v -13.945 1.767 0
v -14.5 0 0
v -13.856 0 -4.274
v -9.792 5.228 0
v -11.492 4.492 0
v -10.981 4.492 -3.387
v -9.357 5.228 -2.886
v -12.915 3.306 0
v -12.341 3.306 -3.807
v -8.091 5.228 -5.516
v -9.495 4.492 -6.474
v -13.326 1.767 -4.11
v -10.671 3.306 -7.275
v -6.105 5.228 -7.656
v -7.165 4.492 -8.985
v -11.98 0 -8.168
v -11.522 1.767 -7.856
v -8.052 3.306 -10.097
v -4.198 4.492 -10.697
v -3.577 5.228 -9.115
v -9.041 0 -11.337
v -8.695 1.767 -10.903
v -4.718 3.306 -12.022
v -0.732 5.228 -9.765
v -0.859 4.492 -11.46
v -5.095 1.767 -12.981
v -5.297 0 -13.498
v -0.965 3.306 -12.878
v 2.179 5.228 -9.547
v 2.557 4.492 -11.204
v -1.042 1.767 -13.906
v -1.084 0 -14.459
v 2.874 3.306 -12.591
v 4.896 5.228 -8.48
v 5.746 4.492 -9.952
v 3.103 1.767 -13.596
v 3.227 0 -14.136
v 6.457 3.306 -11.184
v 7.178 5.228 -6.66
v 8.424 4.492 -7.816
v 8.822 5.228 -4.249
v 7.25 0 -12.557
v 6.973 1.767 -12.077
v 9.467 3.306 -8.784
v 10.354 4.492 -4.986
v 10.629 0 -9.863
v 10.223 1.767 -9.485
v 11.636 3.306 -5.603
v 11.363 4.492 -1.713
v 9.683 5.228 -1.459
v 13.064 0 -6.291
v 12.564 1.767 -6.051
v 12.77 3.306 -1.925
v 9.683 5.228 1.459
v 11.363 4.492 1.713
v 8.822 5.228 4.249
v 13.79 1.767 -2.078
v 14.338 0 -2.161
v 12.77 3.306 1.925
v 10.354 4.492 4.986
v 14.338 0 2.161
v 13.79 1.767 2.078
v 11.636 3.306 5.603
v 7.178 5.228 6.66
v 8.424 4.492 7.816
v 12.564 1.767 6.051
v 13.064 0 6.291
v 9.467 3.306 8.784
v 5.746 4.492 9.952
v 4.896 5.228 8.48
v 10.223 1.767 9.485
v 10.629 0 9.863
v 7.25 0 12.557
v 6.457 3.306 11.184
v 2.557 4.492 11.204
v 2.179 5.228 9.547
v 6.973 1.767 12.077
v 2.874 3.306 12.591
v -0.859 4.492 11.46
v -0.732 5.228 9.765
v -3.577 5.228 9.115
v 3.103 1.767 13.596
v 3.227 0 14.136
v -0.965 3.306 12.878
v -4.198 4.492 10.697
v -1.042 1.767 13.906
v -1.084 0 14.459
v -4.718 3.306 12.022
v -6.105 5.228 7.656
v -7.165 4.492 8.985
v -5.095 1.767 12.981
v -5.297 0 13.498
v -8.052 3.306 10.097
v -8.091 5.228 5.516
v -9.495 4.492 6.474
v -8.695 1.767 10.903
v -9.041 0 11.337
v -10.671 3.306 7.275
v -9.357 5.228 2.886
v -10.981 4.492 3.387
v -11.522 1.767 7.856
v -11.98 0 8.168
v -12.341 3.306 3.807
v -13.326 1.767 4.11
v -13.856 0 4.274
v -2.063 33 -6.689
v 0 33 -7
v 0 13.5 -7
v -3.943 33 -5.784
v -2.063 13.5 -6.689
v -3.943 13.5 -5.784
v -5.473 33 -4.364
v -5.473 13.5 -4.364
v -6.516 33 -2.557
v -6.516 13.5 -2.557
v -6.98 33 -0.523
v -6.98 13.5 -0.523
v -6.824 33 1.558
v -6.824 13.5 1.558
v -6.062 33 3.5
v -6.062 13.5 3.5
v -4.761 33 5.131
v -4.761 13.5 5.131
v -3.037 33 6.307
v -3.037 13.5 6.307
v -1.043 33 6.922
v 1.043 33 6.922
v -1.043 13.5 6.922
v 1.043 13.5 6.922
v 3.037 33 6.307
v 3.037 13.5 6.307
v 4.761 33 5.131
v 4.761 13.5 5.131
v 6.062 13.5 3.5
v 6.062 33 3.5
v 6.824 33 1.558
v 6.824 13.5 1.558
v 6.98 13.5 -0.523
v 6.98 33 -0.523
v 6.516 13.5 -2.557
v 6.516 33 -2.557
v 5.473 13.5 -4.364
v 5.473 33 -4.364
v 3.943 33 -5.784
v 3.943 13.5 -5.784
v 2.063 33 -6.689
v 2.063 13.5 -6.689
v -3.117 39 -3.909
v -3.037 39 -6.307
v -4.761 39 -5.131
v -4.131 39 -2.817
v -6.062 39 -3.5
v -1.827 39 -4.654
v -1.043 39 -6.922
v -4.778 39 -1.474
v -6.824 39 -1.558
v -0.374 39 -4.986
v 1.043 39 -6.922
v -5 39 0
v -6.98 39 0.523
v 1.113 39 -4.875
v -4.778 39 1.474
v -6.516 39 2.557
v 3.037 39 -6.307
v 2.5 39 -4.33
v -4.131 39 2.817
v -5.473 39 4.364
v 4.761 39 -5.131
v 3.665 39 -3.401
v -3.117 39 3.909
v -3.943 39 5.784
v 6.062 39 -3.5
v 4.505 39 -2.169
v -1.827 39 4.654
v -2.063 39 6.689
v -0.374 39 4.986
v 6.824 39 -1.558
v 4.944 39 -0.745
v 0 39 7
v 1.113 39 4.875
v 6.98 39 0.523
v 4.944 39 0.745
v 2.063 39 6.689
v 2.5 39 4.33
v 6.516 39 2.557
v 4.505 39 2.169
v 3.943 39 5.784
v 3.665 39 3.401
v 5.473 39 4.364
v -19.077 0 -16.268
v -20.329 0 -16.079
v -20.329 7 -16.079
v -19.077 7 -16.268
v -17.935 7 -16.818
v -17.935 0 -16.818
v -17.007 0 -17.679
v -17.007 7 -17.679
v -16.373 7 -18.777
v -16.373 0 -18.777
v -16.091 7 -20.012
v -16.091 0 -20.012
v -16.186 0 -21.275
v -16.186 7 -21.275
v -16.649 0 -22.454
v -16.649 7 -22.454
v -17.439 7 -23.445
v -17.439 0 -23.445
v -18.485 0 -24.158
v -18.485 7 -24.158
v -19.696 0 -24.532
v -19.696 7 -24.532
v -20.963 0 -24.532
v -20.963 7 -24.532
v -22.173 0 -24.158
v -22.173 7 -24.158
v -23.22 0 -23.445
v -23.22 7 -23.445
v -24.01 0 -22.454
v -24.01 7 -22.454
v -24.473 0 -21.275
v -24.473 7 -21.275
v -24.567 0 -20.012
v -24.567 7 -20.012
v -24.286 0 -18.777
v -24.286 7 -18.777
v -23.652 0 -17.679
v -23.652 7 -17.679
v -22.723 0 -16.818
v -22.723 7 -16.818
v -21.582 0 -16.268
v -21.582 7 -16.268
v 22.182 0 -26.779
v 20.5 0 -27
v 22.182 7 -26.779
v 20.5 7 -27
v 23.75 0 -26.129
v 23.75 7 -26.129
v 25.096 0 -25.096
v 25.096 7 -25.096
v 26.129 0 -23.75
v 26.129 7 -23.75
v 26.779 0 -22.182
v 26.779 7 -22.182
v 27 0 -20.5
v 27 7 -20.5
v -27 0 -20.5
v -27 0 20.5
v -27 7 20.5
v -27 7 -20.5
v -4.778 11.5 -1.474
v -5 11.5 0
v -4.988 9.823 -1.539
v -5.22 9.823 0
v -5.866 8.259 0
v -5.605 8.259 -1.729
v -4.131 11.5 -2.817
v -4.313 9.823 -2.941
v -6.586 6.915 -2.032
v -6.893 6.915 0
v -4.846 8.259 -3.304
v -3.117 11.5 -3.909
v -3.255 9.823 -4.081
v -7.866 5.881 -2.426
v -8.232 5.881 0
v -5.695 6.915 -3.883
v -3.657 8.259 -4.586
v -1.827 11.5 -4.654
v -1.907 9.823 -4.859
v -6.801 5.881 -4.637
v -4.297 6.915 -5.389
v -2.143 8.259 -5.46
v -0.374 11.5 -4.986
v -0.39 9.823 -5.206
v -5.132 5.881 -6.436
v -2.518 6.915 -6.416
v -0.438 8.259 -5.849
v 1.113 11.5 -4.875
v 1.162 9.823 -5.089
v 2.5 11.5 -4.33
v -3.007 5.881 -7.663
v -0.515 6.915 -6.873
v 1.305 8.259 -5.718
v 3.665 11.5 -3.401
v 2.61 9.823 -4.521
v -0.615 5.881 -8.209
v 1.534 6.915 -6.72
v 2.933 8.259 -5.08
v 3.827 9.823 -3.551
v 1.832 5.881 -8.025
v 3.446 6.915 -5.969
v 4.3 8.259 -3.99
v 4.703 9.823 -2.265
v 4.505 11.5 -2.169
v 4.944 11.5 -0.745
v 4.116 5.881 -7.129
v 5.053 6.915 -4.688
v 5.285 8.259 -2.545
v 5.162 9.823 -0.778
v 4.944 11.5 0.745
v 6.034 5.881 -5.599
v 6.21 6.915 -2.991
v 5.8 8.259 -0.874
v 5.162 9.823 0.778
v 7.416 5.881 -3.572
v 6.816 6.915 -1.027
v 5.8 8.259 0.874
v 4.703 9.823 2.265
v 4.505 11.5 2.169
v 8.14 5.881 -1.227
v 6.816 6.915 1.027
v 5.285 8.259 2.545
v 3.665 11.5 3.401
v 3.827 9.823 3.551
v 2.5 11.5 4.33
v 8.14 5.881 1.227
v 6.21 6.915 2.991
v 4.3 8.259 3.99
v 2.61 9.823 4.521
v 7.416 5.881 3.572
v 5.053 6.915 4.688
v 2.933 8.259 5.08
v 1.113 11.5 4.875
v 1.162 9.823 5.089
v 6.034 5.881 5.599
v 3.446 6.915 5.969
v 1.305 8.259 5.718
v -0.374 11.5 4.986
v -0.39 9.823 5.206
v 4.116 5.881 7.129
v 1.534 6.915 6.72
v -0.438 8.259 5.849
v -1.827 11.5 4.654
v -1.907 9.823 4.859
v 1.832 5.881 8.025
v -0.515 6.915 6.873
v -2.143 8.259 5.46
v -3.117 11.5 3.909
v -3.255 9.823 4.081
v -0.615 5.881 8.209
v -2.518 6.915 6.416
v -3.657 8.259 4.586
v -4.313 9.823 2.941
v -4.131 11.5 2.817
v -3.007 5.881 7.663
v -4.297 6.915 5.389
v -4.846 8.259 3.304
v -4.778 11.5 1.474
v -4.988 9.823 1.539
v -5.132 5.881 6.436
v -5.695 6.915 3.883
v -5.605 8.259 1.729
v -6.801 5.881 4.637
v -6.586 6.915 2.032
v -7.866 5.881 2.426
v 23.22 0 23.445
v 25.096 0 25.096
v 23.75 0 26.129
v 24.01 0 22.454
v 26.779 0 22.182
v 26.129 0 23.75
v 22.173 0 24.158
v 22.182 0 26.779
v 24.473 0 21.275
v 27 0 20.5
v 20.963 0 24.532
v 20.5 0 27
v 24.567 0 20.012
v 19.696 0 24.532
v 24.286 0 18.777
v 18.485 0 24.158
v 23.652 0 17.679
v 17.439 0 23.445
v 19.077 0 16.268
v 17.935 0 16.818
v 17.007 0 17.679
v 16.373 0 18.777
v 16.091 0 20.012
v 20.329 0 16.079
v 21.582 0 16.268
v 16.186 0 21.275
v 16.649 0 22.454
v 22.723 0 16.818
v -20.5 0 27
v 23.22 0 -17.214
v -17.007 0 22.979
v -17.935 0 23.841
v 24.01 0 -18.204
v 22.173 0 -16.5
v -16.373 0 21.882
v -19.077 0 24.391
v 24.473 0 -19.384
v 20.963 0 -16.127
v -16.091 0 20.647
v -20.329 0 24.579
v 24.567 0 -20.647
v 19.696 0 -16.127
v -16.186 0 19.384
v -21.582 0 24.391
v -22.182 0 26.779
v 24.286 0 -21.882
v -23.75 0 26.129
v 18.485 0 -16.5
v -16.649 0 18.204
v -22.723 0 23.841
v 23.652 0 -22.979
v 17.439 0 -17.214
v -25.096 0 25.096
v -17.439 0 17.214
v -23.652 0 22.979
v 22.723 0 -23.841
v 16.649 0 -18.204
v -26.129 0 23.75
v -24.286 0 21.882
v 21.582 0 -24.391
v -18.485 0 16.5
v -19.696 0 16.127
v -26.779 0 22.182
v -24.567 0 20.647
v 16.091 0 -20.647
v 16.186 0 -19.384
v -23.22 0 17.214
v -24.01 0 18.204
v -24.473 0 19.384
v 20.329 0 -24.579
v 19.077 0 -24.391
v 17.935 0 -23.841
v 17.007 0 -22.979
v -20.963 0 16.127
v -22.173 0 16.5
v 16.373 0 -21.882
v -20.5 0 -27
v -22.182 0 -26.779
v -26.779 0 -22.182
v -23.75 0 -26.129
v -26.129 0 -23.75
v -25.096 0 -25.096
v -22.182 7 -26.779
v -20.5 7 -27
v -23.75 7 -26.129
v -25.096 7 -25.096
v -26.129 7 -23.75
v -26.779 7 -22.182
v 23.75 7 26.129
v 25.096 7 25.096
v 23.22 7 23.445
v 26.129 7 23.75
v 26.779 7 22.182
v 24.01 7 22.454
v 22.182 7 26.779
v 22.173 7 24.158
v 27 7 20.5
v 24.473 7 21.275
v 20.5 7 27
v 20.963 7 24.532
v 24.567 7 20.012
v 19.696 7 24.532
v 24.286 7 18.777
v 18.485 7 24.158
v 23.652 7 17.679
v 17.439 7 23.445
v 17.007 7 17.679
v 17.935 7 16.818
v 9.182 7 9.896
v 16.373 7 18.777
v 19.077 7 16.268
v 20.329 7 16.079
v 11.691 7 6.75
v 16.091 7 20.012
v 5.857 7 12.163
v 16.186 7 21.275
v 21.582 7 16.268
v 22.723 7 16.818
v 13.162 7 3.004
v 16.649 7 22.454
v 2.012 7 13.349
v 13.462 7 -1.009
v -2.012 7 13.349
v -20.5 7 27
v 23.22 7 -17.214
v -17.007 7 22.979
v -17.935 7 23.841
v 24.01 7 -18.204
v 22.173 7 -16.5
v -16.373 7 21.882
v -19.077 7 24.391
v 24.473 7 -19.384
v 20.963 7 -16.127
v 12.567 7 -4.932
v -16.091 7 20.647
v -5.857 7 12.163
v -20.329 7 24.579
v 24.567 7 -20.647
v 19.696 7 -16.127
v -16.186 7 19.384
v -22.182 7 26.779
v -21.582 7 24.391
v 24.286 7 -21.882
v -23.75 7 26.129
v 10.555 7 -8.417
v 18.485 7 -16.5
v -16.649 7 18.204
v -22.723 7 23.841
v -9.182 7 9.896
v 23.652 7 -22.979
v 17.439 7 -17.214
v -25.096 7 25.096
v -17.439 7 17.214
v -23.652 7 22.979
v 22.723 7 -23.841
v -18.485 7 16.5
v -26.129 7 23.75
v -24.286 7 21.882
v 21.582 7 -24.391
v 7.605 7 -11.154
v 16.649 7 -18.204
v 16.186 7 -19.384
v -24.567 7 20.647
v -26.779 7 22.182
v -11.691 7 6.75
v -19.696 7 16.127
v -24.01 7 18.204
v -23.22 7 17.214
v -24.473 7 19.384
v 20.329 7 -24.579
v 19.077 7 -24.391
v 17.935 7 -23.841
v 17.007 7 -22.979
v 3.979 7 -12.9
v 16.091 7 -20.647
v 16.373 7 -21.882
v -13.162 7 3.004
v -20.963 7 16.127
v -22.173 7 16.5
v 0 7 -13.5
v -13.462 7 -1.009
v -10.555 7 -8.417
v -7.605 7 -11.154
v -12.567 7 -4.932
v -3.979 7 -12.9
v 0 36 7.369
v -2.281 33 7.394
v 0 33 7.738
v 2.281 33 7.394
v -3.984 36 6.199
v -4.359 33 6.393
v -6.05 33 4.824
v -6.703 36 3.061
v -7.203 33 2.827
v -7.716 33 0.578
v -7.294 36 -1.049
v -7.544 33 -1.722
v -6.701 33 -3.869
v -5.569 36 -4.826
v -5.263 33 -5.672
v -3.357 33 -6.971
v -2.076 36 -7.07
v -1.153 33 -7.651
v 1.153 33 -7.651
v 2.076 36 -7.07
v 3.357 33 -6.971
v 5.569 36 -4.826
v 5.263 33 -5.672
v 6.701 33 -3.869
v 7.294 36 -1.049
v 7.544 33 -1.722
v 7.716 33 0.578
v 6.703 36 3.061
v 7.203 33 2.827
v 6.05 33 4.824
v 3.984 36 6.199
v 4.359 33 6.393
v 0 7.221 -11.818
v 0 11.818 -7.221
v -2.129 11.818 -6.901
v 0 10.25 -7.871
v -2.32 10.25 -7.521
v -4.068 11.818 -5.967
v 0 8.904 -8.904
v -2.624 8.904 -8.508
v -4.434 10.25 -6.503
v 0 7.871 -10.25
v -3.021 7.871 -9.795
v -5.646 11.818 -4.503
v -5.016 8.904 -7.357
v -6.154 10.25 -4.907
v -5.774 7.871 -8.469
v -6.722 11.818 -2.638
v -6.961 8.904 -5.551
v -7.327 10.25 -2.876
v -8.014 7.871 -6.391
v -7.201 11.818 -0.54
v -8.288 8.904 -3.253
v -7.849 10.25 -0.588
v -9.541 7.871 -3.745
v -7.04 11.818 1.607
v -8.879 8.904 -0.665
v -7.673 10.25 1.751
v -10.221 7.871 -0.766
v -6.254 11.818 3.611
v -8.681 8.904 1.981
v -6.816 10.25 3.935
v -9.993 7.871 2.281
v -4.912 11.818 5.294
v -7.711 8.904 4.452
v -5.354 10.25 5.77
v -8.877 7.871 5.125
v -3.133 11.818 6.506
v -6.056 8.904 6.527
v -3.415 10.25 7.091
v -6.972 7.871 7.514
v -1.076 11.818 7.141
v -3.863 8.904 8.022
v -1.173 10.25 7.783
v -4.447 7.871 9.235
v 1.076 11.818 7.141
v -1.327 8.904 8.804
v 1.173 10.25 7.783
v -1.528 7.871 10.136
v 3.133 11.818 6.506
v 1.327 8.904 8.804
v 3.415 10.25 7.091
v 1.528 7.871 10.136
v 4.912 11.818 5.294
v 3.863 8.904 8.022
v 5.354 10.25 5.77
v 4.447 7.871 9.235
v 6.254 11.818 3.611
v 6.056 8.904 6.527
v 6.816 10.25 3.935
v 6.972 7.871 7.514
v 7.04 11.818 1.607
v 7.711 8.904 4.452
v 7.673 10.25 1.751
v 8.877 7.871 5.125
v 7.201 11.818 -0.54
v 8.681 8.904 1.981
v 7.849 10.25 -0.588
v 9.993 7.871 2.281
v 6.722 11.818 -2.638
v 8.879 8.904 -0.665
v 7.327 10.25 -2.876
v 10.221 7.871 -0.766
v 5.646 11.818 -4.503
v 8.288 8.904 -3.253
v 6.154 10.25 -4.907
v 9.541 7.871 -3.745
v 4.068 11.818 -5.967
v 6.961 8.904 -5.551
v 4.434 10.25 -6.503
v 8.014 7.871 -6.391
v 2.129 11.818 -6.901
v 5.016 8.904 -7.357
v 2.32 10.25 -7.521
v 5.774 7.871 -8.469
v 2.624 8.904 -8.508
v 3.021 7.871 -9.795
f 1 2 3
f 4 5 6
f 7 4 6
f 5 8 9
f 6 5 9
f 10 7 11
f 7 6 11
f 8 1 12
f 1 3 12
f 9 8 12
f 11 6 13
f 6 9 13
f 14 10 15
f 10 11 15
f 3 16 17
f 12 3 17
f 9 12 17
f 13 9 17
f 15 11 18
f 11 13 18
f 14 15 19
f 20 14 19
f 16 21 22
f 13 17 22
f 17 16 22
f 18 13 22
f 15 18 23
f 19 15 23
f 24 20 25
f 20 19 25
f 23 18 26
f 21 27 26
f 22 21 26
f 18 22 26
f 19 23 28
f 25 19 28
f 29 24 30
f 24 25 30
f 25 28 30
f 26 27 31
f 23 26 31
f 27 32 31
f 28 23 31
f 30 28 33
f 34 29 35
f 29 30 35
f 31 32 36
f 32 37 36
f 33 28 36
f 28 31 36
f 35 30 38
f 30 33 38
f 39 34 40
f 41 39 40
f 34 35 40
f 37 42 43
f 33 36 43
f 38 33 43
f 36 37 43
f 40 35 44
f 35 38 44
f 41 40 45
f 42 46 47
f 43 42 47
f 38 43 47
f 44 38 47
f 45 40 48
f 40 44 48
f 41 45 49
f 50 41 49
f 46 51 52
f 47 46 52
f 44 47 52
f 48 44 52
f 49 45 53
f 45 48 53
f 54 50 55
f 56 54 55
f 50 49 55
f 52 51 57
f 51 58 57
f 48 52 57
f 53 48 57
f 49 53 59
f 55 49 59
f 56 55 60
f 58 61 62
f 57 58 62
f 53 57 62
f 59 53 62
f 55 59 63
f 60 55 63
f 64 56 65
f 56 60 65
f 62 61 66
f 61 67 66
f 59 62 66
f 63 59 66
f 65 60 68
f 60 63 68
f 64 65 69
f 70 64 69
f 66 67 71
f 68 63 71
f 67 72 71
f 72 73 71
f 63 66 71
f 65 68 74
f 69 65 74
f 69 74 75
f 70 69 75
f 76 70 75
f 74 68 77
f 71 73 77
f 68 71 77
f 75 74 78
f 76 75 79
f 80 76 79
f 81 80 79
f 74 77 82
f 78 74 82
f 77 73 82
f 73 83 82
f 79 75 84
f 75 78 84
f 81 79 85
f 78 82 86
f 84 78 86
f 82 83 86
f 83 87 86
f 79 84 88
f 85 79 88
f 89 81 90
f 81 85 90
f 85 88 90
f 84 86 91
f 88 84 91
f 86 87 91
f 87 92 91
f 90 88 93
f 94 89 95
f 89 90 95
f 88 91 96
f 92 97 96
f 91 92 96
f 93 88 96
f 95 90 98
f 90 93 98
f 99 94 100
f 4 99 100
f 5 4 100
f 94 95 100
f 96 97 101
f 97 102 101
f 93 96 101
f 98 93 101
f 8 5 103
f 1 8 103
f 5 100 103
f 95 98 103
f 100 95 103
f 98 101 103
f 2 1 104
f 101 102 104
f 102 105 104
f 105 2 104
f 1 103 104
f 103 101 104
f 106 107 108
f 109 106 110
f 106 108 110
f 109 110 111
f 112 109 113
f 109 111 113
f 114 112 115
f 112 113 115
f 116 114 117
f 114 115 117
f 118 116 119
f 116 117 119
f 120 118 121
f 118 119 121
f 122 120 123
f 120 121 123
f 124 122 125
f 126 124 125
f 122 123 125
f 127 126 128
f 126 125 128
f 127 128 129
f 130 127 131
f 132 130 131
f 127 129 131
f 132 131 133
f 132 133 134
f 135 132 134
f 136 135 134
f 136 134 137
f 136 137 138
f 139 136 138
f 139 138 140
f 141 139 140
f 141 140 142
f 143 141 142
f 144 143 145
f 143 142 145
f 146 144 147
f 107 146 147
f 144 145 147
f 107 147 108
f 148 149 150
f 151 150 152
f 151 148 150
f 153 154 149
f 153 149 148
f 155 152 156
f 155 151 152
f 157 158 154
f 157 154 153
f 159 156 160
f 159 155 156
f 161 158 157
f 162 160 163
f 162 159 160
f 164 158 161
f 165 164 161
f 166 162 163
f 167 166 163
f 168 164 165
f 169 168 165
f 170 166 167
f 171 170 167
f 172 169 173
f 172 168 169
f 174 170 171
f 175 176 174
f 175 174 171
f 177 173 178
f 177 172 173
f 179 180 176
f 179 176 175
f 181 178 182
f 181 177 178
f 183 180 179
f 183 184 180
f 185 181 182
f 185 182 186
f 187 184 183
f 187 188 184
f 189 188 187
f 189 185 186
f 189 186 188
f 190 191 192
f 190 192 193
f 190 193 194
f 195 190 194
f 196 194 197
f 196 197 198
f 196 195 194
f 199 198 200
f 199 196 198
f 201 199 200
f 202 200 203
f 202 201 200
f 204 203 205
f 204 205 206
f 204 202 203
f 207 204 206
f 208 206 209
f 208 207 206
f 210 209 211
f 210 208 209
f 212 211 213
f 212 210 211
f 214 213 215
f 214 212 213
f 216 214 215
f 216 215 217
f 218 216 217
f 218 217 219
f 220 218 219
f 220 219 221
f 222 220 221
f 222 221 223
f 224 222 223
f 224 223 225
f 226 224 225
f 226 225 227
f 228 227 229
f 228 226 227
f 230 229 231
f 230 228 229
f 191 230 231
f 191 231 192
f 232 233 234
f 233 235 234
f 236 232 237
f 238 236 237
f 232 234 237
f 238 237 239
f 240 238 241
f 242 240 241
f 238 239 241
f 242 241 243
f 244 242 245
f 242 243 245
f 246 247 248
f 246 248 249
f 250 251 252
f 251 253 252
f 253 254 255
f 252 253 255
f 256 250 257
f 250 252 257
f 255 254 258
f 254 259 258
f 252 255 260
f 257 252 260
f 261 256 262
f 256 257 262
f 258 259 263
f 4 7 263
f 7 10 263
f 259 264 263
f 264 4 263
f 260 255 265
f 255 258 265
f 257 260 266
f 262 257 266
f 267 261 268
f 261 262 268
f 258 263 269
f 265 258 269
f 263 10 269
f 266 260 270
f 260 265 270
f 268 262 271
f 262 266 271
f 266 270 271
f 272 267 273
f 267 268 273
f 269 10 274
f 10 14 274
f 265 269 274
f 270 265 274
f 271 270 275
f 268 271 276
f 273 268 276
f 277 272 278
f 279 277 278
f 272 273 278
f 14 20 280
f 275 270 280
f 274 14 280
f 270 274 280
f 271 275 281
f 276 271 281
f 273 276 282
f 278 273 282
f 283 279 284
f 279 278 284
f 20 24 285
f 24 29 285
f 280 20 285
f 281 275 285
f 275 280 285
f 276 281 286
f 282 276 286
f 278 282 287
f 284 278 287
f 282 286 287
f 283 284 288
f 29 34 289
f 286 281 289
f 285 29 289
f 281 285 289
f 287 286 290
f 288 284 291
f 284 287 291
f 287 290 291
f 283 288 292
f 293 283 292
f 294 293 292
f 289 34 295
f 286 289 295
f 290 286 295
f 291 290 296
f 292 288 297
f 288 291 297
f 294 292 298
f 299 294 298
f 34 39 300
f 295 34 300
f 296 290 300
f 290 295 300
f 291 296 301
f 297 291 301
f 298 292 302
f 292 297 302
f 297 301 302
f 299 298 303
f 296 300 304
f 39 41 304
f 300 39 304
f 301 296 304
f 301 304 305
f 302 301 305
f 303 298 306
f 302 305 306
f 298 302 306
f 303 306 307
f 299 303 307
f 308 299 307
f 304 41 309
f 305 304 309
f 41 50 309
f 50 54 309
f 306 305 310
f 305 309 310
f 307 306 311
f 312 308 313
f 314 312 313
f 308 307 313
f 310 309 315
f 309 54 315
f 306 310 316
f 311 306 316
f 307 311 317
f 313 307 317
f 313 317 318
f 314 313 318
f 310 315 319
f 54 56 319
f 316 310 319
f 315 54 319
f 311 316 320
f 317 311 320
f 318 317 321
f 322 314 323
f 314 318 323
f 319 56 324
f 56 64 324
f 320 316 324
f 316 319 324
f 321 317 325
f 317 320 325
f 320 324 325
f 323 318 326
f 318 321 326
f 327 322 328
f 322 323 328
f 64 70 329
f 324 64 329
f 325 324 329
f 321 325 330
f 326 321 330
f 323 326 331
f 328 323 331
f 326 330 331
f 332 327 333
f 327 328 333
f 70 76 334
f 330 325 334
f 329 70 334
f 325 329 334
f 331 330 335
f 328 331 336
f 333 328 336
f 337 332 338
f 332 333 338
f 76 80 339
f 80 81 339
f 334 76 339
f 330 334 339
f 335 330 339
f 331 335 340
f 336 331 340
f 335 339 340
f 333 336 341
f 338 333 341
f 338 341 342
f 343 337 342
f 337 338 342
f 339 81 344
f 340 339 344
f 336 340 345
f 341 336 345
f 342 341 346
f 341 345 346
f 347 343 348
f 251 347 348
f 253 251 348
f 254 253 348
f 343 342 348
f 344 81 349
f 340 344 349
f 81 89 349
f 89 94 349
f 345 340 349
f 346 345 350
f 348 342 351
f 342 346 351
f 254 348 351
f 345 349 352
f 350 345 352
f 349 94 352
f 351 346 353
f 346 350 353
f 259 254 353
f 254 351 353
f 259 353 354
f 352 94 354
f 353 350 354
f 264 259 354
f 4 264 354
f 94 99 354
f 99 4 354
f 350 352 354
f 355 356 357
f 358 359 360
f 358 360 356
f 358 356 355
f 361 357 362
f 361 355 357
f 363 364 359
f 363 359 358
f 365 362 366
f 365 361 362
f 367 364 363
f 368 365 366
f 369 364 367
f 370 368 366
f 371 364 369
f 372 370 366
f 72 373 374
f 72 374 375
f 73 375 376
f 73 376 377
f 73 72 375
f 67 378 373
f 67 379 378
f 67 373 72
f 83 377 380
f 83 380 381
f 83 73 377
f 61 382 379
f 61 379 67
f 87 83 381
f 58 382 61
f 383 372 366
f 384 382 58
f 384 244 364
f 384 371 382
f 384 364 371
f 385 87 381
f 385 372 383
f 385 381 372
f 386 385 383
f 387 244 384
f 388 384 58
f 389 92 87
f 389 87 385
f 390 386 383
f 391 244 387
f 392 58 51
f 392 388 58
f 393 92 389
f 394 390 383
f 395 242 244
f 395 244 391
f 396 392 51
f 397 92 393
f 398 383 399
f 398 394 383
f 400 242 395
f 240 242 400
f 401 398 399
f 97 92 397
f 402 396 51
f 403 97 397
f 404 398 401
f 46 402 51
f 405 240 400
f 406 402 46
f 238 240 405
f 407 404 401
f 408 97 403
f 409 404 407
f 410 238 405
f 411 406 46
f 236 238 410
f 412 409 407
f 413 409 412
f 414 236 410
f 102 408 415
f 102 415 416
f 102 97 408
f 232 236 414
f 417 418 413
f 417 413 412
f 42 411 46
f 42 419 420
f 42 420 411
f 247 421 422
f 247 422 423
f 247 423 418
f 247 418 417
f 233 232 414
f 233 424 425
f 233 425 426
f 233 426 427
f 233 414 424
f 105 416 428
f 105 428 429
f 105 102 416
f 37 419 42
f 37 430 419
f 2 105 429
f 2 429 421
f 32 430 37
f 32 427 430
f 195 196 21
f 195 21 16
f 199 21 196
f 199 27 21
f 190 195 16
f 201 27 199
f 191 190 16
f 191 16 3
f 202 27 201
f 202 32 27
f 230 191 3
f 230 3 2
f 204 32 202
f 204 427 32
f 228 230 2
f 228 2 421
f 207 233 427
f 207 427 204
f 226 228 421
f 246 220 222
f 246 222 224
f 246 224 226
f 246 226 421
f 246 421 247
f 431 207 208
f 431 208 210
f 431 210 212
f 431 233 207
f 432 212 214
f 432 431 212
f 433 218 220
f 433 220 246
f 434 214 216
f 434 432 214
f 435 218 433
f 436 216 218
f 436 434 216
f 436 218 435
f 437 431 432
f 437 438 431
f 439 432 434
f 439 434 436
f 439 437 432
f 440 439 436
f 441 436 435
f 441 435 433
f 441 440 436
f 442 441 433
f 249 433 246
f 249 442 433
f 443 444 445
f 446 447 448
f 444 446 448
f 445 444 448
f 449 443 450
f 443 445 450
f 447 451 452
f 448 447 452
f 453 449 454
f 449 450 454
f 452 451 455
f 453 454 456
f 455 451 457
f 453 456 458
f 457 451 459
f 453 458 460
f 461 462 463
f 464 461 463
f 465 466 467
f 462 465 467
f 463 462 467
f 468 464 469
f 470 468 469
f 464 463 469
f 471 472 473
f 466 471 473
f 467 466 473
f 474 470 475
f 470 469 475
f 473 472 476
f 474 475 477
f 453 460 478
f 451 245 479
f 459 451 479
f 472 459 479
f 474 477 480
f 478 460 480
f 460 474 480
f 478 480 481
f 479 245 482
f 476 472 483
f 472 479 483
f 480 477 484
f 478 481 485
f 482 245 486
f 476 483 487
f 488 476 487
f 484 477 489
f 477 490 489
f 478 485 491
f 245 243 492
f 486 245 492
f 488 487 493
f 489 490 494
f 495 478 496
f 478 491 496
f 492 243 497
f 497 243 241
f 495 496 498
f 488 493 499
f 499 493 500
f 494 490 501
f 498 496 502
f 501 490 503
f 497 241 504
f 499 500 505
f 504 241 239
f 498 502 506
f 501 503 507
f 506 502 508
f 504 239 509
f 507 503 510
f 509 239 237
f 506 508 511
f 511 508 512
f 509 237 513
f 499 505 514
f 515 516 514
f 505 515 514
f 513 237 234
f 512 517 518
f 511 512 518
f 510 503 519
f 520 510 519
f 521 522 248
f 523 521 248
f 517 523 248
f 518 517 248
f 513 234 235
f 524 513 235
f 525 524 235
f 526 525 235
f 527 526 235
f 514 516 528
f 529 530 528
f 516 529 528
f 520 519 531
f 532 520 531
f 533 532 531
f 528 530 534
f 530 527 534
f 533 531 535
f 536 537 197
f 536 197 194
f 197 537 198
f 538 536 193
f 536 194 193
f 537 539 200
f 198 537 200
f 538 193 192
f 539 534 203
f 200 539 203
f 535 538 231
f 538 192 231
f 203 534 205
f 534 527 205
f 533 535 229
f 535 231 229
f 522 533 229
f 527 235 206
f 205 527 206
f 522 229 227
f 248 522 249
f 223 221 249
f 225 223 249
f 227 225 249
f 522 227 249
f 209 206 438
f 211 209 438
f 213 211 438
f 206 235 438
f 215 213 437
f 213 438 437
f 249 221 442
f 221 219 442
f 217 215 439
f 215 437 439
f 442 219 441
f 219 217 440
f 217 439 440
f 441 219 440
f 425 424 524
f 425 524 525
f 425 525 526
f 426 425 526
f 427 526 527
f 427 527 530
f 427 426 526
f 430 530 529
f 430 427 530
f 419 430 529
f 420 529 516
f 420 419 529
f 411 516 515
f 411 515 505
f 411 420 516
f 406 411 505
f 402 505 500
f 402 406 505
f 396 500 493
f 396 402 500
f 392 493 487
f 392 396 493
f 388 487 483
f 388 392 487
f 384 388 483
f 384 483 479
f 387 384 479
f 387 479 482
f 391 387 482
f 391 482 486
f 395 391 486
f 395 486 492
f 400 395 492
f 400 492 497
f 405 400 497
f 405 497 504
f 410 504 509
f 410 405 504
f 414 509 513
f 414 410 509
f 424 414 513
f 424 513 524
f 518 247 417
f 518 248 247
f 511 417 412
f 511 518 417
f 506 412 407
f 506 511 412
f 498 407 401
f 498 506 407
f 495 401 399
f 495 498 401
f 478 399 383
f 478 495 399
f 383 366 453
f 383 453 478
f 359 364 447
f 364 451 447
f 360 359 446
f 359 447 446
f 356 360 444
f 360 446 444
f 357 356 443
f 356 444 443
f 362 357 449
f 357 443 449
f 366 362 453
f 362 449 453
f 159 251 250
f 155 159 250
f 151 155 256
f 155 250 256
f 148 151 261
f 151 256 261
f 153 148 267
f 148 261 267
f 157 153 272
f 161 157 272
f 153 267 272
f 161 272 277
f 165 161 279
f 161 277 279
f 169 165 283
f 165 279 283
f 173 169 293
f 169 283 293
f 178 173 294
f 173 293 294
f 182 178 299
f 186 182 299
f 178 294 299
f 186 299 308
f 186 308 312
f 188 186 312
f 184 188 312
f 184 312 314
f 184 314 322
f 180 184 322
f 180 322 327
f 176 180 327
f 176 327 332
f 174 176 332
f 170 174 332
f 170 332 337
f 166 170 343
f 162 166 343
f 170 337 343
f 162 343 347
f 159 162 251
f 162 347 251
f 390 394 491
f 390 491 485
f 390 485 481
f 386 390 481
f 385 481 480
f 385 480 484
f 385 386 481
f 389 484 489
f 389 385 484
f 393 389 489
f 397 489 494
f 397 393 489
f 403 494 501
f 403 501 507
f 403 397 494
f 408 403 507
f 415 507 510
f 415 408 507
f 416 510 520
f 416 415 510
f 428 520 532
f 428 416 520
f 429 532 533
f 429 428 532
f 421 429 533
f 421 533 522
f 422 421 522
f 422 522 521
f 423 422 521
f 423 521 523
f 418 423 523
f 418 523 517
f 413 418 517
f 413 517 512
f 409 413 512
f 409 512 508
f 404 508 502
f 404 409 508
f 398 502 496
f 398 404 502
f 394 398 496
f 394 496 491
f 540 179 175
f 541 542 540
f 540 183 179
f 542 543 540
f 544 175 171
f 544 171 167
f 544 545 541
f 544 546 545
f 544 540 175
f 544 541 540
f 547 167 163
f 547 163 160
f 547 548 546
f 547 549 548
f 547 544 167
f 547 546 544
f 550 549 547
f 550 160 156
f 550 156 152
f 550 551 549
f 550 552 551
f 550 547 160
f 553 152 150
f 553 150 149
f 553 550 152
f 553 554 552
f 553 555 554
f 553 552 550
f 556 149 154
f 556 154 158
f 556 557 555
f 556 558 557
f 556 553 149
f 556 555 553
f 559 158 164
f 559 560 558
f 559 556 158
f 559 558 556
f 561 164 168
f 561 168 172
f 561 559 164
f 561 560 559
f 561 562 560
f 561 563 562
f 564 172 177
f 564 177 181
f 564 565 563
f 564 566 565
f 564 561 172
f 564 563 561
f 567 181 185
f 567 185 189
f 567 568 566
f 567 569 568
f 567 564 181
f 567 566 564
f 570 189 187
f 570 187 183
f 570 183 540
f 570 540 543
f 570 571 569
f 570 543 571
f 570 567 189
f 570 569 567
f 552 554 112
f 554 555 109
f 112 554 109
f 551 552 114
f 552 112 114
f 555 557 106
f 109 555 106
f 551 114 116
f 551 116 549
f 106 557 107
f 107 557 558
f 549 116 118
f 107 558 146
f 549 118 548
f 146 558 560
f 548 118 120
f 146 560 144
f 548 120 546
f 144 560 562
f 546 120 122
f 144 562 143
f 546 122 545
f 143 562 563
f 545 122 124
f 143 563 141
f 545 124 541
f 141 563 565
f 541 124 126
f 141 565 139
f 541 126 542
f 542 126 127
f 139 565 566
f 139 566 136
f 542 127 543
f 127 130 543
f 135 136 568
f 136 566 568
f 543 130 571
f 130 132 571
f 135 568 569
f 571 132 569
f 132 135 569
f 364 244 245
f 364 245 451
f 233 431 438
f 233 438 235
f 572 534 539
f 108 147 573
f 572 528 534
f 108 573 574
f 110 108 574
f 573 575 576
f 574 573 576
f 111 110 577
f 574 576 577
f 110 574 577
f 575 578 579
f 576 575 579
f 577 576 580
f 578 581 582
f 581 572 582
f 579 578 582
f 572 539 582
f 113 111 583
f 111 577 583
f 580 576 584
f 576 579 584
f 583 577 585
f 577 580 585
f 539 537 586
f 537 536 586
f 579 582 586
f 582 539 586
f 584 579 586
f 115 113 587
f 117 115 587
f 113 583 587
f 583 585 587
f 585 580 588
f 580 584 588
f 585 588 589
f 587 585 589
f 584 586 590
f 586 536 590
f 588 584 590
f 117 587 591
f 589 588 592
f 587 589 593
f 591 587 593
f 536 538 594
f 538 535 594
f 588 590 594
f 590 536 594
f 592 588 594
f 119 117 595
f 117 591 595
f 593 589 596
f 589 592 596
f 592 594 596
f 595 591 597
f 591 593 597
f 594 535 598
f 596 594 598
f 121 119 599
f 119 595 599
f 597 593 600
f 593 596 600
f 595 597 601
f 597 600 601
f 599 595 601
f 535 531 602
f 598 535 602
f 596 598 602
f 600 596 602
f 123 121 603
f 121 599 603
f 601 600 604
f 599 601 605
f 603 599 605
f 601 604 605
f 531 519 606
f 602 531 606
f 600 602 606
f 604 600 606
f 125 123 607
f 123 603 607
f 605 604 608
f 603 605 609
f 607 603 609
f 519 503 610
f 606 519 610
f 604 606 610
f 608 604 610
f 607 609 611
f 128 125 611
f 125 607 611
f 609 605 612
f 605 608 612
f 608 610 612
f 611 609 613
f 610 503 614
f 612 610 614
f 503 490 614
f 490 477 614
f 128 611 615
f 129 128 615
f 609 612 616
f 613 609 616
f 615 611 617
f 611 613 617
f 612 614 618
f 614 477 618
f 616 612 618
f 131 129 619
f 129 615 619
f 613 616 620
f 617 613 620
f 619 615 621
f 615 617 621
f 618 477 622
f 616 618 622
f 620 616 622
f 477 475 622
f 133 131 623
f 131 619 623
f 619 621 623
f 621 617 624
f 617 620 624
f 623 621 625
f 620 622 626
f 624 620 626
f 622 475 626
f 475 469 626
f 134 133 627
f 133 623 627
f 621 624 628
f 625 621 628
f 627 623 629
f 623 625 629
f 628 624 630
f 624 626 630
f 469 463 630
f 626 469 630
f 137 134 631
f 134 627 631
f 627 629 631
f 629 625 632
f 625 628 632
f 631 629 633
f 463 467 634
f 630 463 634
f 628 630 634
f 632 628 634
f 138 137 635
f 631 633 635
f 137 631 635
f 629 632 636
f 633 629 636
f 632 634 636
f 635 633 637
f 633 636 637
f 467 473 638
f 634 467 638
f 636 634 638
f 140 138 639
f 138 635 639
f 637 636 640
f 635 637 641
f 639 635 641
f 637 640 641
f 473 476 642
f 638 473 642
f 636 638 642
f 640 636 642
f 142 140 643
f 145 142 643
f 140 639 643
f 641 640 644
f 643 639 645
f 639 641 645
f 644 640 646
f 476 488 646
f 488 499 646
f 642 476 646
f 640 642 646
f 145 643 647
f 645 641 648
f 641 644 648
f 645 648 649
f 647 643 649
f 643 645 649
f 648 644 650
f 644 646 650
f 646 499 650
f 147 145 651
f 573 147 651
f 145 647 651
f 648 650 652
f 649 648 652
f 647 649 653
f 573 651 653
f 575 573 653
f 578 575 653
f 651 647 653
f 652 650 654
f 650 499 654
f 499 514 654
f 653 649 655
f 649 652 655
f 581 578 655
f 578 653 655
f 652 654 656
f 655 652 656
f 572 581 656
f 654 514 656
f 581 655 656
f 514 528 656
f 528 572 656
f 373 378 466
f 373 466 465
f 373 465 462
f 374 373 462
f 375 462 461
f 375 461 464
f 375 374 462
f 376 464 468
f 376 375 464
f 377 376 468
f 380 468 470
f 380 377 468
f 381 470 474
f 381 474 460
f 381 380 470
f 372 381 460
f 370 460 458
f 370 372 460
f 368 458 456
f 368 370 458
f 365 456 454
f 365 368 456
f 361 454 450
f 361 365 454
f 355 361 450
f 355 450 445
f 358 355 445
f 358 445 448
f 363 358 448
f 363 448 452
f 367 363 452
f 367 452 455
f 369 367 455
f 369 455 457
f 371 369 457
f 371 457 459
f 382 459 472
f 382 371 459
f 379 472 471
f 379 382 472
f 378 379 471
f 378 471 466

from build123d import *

# Parameters (mm, degrees)
SKETCH1_R           = 4.250000000000005
SKETCH1_R_2         = 4.250000000000013
SKETCH1_R_3         = 4.2500000000000036
BOSS_EXTRUDE1_DEPTH = 7
FILLET2_R           = 6.5
SKETCH4_R           = 7
BOSS_EXTRUDE3_DEPTH = 26
SKETCH5_R           = 7.75
BOSS_EXTRUDE4_DEPTH = 6
FILLET3_R           = 6.5
FILLET4_R           = 6.5
FILLET5_R           = 6.5


with BuildPart() as part:
    # Sketch1 → Boss-Extrude1 (new body)
    with BuildSketch(Plane(origin=(0, 0, 0), x_dir=(1, 0, 0), z_dir=(0, 1, 0))):
        Polygon((-27, 27), (27, 27), (27.000000000000007, -27), (-26.999999999999993, -27), align=None)
        with Locations(Location((-20.329319959113246, 20.329319959113246, 0), (0, 0, 270))):
            Circle(SKETCH1_R, mode=Mode.SUBTRACT)
        with Locations(Location((20.32931995911324, -20.329319959113246, 0), (0, 0, 90))):
            Circle(SKETCH1_R_2, mode=Mode.SUBTRACT)
        with Locations(Location((-20.329319959113224, -20.329319959113246, 0), (0, 0, 270))):
            Circle(SKETCH1_R_2, mode=Mode.SUBTRACT)
        with Locations(Location((20.329319959113246, 20.329319959113253, 0), (0, 0, 90))):
            Circle(SKETCH1_R_3, mode=Mode.SUBTRACT)
    extrude(amount=BOSS_EXTRUDE1_DEPTH)

    # Fillet2
    fillet2_edges = [part.edges().sort_by_distance(p)[0] for p in [
        (27.000000000000007, 3.5, 27),
        (-26.999999999999993, 3.5, 27),
        (-27, 3.5, -27),
        (27, 3.5, -27),
    ]]
    fillet(fillet2_edges, radius=FILLET2_R)

    # Sketch4 → Boss-Extrude3 (add)
    with BuildSketch(Plane(origin=(0, 7, 0), x_dir=(1, 0, 0), z_dir=(0, 1, 0))):
        with Locations(Location((0, 0, 0), (0, 0, 90))):
            Circle(SKETCH4_R)
    extrude(amount=BOSS_EXTRUDE3_DEPTH)

    # Sketch5 → Boss-Extrude4 (add)
    with BuildSketch(Plane(origin=(0, 33, 0), x_dir=(1, 0, 0), z_dir=(0, 1, 0))):
        with Locations(Location((0, 0, 0), (0, 0, 270))):
            Circle(SKETCH5_R)
    extrude(amount=BOSS_EXTRUDE4_DEPTH)

    # Sketch6 → Cut-Revolve1 (revolve, cut)
    with BuildSketch(Plane.XY, mode=Mode.PRIVATE) as cut_revolve1_sk:
        Polygon((6.8958692457127615, 39.84698008319777), (7.935722009021632, 31.389012156149754), (8.514556179291803, 31.389012156149754), (8.514556179291803, 39.84698008319777), align=None)
    revolve(cut_revolve1_sk.sketch.rotate(Axis((0, 39, 0), (0, -1, 0)), 90), axis=Axis((0, 39, 0), (0, -1, 0)), mode=Mode.SUBTRACT)

    # Fillet3
    fillet3_edges = [part.edges().sort_by_distance(p)[0] for p in [
        (-1.29e-15, 7, 7),
    ]]
    fillet(fillet3_edges, radius=FILLET3_R)

    # Sketch7 → Cut-Revolve2 (revolve, cut)
    with BuildSketch(Plane.XY, mode=Mode.PRIVATE) as cut_revolve2_sk:
        Polygon((4.999999999999997, 41.673662522697256), (5.000000000000003, 4.999999999999999), (14.500000000000009, 5), (14.50000000000001, 1.128e-14), (0, -2.109667236724723), (1.73e-15, 41.673662522697256), align=None)
    revolve(cut_revolve2_sk.sketch.rotate(Axis((1.73e-15, 41.673662522697256, 0), (-4e-17, -1, 0)), 180), axis=Axis((1.73e-15, 41.673662522697256, 0), (-4e-17, -1, 0)), mode=Mode.SUBTRACT)

    # Fillet4
    fillet4_edges = [part.edges().sort_by_distance(p)[0] for p in [
        (5.000000000000003, 5, -1.22e-15),
    ]]
    fillet(fillet4_edges, radius=FILLET4_R)

    # Fillet5
    # the kernel refuses this fillet: 6.5 mm, written as the material it adds along each edge
    with BuildSketch(Plane(origin=(2.8e-16, 5, 0), x_dir=(-1, 6e-17, 1.2e-16), z_dir=(1.2e-16, 0, 1))) as fillet5_piece_1:
        with BuildLine():
            CenterArc((8.084264649295068, 6.043235308880427), FILLET5_R, 285.23323327747323, 65.5309787307709)
            Line((14.500000000001535, 4.999999999999738), (15.141573535072181, 4.895676469111669))
            ThreePointArc((15.141573535072181, 4.895676469111669), (15.15000000000001, 2.499999999999869), (15.15000000000001, 4e-17))
            Line((15.15000000000001, 4e-17), (14.500000000000009, -0.6500000000000004))
            ThreePointArc((14.500000000000009, -0.6500000000000004), (11.499999999999995, -0.6500000000000006), (9.962919092182778, -0.8555441110038083))
            Line((9.962919092182778, -0.8555441110038083), (9.792132324647532, -0.22838234555978715))
        make_face()
    revolve(axis=Axis((2.8e-16, 5, 0), (-4e-17, -1, 0)))


solid = part.part
